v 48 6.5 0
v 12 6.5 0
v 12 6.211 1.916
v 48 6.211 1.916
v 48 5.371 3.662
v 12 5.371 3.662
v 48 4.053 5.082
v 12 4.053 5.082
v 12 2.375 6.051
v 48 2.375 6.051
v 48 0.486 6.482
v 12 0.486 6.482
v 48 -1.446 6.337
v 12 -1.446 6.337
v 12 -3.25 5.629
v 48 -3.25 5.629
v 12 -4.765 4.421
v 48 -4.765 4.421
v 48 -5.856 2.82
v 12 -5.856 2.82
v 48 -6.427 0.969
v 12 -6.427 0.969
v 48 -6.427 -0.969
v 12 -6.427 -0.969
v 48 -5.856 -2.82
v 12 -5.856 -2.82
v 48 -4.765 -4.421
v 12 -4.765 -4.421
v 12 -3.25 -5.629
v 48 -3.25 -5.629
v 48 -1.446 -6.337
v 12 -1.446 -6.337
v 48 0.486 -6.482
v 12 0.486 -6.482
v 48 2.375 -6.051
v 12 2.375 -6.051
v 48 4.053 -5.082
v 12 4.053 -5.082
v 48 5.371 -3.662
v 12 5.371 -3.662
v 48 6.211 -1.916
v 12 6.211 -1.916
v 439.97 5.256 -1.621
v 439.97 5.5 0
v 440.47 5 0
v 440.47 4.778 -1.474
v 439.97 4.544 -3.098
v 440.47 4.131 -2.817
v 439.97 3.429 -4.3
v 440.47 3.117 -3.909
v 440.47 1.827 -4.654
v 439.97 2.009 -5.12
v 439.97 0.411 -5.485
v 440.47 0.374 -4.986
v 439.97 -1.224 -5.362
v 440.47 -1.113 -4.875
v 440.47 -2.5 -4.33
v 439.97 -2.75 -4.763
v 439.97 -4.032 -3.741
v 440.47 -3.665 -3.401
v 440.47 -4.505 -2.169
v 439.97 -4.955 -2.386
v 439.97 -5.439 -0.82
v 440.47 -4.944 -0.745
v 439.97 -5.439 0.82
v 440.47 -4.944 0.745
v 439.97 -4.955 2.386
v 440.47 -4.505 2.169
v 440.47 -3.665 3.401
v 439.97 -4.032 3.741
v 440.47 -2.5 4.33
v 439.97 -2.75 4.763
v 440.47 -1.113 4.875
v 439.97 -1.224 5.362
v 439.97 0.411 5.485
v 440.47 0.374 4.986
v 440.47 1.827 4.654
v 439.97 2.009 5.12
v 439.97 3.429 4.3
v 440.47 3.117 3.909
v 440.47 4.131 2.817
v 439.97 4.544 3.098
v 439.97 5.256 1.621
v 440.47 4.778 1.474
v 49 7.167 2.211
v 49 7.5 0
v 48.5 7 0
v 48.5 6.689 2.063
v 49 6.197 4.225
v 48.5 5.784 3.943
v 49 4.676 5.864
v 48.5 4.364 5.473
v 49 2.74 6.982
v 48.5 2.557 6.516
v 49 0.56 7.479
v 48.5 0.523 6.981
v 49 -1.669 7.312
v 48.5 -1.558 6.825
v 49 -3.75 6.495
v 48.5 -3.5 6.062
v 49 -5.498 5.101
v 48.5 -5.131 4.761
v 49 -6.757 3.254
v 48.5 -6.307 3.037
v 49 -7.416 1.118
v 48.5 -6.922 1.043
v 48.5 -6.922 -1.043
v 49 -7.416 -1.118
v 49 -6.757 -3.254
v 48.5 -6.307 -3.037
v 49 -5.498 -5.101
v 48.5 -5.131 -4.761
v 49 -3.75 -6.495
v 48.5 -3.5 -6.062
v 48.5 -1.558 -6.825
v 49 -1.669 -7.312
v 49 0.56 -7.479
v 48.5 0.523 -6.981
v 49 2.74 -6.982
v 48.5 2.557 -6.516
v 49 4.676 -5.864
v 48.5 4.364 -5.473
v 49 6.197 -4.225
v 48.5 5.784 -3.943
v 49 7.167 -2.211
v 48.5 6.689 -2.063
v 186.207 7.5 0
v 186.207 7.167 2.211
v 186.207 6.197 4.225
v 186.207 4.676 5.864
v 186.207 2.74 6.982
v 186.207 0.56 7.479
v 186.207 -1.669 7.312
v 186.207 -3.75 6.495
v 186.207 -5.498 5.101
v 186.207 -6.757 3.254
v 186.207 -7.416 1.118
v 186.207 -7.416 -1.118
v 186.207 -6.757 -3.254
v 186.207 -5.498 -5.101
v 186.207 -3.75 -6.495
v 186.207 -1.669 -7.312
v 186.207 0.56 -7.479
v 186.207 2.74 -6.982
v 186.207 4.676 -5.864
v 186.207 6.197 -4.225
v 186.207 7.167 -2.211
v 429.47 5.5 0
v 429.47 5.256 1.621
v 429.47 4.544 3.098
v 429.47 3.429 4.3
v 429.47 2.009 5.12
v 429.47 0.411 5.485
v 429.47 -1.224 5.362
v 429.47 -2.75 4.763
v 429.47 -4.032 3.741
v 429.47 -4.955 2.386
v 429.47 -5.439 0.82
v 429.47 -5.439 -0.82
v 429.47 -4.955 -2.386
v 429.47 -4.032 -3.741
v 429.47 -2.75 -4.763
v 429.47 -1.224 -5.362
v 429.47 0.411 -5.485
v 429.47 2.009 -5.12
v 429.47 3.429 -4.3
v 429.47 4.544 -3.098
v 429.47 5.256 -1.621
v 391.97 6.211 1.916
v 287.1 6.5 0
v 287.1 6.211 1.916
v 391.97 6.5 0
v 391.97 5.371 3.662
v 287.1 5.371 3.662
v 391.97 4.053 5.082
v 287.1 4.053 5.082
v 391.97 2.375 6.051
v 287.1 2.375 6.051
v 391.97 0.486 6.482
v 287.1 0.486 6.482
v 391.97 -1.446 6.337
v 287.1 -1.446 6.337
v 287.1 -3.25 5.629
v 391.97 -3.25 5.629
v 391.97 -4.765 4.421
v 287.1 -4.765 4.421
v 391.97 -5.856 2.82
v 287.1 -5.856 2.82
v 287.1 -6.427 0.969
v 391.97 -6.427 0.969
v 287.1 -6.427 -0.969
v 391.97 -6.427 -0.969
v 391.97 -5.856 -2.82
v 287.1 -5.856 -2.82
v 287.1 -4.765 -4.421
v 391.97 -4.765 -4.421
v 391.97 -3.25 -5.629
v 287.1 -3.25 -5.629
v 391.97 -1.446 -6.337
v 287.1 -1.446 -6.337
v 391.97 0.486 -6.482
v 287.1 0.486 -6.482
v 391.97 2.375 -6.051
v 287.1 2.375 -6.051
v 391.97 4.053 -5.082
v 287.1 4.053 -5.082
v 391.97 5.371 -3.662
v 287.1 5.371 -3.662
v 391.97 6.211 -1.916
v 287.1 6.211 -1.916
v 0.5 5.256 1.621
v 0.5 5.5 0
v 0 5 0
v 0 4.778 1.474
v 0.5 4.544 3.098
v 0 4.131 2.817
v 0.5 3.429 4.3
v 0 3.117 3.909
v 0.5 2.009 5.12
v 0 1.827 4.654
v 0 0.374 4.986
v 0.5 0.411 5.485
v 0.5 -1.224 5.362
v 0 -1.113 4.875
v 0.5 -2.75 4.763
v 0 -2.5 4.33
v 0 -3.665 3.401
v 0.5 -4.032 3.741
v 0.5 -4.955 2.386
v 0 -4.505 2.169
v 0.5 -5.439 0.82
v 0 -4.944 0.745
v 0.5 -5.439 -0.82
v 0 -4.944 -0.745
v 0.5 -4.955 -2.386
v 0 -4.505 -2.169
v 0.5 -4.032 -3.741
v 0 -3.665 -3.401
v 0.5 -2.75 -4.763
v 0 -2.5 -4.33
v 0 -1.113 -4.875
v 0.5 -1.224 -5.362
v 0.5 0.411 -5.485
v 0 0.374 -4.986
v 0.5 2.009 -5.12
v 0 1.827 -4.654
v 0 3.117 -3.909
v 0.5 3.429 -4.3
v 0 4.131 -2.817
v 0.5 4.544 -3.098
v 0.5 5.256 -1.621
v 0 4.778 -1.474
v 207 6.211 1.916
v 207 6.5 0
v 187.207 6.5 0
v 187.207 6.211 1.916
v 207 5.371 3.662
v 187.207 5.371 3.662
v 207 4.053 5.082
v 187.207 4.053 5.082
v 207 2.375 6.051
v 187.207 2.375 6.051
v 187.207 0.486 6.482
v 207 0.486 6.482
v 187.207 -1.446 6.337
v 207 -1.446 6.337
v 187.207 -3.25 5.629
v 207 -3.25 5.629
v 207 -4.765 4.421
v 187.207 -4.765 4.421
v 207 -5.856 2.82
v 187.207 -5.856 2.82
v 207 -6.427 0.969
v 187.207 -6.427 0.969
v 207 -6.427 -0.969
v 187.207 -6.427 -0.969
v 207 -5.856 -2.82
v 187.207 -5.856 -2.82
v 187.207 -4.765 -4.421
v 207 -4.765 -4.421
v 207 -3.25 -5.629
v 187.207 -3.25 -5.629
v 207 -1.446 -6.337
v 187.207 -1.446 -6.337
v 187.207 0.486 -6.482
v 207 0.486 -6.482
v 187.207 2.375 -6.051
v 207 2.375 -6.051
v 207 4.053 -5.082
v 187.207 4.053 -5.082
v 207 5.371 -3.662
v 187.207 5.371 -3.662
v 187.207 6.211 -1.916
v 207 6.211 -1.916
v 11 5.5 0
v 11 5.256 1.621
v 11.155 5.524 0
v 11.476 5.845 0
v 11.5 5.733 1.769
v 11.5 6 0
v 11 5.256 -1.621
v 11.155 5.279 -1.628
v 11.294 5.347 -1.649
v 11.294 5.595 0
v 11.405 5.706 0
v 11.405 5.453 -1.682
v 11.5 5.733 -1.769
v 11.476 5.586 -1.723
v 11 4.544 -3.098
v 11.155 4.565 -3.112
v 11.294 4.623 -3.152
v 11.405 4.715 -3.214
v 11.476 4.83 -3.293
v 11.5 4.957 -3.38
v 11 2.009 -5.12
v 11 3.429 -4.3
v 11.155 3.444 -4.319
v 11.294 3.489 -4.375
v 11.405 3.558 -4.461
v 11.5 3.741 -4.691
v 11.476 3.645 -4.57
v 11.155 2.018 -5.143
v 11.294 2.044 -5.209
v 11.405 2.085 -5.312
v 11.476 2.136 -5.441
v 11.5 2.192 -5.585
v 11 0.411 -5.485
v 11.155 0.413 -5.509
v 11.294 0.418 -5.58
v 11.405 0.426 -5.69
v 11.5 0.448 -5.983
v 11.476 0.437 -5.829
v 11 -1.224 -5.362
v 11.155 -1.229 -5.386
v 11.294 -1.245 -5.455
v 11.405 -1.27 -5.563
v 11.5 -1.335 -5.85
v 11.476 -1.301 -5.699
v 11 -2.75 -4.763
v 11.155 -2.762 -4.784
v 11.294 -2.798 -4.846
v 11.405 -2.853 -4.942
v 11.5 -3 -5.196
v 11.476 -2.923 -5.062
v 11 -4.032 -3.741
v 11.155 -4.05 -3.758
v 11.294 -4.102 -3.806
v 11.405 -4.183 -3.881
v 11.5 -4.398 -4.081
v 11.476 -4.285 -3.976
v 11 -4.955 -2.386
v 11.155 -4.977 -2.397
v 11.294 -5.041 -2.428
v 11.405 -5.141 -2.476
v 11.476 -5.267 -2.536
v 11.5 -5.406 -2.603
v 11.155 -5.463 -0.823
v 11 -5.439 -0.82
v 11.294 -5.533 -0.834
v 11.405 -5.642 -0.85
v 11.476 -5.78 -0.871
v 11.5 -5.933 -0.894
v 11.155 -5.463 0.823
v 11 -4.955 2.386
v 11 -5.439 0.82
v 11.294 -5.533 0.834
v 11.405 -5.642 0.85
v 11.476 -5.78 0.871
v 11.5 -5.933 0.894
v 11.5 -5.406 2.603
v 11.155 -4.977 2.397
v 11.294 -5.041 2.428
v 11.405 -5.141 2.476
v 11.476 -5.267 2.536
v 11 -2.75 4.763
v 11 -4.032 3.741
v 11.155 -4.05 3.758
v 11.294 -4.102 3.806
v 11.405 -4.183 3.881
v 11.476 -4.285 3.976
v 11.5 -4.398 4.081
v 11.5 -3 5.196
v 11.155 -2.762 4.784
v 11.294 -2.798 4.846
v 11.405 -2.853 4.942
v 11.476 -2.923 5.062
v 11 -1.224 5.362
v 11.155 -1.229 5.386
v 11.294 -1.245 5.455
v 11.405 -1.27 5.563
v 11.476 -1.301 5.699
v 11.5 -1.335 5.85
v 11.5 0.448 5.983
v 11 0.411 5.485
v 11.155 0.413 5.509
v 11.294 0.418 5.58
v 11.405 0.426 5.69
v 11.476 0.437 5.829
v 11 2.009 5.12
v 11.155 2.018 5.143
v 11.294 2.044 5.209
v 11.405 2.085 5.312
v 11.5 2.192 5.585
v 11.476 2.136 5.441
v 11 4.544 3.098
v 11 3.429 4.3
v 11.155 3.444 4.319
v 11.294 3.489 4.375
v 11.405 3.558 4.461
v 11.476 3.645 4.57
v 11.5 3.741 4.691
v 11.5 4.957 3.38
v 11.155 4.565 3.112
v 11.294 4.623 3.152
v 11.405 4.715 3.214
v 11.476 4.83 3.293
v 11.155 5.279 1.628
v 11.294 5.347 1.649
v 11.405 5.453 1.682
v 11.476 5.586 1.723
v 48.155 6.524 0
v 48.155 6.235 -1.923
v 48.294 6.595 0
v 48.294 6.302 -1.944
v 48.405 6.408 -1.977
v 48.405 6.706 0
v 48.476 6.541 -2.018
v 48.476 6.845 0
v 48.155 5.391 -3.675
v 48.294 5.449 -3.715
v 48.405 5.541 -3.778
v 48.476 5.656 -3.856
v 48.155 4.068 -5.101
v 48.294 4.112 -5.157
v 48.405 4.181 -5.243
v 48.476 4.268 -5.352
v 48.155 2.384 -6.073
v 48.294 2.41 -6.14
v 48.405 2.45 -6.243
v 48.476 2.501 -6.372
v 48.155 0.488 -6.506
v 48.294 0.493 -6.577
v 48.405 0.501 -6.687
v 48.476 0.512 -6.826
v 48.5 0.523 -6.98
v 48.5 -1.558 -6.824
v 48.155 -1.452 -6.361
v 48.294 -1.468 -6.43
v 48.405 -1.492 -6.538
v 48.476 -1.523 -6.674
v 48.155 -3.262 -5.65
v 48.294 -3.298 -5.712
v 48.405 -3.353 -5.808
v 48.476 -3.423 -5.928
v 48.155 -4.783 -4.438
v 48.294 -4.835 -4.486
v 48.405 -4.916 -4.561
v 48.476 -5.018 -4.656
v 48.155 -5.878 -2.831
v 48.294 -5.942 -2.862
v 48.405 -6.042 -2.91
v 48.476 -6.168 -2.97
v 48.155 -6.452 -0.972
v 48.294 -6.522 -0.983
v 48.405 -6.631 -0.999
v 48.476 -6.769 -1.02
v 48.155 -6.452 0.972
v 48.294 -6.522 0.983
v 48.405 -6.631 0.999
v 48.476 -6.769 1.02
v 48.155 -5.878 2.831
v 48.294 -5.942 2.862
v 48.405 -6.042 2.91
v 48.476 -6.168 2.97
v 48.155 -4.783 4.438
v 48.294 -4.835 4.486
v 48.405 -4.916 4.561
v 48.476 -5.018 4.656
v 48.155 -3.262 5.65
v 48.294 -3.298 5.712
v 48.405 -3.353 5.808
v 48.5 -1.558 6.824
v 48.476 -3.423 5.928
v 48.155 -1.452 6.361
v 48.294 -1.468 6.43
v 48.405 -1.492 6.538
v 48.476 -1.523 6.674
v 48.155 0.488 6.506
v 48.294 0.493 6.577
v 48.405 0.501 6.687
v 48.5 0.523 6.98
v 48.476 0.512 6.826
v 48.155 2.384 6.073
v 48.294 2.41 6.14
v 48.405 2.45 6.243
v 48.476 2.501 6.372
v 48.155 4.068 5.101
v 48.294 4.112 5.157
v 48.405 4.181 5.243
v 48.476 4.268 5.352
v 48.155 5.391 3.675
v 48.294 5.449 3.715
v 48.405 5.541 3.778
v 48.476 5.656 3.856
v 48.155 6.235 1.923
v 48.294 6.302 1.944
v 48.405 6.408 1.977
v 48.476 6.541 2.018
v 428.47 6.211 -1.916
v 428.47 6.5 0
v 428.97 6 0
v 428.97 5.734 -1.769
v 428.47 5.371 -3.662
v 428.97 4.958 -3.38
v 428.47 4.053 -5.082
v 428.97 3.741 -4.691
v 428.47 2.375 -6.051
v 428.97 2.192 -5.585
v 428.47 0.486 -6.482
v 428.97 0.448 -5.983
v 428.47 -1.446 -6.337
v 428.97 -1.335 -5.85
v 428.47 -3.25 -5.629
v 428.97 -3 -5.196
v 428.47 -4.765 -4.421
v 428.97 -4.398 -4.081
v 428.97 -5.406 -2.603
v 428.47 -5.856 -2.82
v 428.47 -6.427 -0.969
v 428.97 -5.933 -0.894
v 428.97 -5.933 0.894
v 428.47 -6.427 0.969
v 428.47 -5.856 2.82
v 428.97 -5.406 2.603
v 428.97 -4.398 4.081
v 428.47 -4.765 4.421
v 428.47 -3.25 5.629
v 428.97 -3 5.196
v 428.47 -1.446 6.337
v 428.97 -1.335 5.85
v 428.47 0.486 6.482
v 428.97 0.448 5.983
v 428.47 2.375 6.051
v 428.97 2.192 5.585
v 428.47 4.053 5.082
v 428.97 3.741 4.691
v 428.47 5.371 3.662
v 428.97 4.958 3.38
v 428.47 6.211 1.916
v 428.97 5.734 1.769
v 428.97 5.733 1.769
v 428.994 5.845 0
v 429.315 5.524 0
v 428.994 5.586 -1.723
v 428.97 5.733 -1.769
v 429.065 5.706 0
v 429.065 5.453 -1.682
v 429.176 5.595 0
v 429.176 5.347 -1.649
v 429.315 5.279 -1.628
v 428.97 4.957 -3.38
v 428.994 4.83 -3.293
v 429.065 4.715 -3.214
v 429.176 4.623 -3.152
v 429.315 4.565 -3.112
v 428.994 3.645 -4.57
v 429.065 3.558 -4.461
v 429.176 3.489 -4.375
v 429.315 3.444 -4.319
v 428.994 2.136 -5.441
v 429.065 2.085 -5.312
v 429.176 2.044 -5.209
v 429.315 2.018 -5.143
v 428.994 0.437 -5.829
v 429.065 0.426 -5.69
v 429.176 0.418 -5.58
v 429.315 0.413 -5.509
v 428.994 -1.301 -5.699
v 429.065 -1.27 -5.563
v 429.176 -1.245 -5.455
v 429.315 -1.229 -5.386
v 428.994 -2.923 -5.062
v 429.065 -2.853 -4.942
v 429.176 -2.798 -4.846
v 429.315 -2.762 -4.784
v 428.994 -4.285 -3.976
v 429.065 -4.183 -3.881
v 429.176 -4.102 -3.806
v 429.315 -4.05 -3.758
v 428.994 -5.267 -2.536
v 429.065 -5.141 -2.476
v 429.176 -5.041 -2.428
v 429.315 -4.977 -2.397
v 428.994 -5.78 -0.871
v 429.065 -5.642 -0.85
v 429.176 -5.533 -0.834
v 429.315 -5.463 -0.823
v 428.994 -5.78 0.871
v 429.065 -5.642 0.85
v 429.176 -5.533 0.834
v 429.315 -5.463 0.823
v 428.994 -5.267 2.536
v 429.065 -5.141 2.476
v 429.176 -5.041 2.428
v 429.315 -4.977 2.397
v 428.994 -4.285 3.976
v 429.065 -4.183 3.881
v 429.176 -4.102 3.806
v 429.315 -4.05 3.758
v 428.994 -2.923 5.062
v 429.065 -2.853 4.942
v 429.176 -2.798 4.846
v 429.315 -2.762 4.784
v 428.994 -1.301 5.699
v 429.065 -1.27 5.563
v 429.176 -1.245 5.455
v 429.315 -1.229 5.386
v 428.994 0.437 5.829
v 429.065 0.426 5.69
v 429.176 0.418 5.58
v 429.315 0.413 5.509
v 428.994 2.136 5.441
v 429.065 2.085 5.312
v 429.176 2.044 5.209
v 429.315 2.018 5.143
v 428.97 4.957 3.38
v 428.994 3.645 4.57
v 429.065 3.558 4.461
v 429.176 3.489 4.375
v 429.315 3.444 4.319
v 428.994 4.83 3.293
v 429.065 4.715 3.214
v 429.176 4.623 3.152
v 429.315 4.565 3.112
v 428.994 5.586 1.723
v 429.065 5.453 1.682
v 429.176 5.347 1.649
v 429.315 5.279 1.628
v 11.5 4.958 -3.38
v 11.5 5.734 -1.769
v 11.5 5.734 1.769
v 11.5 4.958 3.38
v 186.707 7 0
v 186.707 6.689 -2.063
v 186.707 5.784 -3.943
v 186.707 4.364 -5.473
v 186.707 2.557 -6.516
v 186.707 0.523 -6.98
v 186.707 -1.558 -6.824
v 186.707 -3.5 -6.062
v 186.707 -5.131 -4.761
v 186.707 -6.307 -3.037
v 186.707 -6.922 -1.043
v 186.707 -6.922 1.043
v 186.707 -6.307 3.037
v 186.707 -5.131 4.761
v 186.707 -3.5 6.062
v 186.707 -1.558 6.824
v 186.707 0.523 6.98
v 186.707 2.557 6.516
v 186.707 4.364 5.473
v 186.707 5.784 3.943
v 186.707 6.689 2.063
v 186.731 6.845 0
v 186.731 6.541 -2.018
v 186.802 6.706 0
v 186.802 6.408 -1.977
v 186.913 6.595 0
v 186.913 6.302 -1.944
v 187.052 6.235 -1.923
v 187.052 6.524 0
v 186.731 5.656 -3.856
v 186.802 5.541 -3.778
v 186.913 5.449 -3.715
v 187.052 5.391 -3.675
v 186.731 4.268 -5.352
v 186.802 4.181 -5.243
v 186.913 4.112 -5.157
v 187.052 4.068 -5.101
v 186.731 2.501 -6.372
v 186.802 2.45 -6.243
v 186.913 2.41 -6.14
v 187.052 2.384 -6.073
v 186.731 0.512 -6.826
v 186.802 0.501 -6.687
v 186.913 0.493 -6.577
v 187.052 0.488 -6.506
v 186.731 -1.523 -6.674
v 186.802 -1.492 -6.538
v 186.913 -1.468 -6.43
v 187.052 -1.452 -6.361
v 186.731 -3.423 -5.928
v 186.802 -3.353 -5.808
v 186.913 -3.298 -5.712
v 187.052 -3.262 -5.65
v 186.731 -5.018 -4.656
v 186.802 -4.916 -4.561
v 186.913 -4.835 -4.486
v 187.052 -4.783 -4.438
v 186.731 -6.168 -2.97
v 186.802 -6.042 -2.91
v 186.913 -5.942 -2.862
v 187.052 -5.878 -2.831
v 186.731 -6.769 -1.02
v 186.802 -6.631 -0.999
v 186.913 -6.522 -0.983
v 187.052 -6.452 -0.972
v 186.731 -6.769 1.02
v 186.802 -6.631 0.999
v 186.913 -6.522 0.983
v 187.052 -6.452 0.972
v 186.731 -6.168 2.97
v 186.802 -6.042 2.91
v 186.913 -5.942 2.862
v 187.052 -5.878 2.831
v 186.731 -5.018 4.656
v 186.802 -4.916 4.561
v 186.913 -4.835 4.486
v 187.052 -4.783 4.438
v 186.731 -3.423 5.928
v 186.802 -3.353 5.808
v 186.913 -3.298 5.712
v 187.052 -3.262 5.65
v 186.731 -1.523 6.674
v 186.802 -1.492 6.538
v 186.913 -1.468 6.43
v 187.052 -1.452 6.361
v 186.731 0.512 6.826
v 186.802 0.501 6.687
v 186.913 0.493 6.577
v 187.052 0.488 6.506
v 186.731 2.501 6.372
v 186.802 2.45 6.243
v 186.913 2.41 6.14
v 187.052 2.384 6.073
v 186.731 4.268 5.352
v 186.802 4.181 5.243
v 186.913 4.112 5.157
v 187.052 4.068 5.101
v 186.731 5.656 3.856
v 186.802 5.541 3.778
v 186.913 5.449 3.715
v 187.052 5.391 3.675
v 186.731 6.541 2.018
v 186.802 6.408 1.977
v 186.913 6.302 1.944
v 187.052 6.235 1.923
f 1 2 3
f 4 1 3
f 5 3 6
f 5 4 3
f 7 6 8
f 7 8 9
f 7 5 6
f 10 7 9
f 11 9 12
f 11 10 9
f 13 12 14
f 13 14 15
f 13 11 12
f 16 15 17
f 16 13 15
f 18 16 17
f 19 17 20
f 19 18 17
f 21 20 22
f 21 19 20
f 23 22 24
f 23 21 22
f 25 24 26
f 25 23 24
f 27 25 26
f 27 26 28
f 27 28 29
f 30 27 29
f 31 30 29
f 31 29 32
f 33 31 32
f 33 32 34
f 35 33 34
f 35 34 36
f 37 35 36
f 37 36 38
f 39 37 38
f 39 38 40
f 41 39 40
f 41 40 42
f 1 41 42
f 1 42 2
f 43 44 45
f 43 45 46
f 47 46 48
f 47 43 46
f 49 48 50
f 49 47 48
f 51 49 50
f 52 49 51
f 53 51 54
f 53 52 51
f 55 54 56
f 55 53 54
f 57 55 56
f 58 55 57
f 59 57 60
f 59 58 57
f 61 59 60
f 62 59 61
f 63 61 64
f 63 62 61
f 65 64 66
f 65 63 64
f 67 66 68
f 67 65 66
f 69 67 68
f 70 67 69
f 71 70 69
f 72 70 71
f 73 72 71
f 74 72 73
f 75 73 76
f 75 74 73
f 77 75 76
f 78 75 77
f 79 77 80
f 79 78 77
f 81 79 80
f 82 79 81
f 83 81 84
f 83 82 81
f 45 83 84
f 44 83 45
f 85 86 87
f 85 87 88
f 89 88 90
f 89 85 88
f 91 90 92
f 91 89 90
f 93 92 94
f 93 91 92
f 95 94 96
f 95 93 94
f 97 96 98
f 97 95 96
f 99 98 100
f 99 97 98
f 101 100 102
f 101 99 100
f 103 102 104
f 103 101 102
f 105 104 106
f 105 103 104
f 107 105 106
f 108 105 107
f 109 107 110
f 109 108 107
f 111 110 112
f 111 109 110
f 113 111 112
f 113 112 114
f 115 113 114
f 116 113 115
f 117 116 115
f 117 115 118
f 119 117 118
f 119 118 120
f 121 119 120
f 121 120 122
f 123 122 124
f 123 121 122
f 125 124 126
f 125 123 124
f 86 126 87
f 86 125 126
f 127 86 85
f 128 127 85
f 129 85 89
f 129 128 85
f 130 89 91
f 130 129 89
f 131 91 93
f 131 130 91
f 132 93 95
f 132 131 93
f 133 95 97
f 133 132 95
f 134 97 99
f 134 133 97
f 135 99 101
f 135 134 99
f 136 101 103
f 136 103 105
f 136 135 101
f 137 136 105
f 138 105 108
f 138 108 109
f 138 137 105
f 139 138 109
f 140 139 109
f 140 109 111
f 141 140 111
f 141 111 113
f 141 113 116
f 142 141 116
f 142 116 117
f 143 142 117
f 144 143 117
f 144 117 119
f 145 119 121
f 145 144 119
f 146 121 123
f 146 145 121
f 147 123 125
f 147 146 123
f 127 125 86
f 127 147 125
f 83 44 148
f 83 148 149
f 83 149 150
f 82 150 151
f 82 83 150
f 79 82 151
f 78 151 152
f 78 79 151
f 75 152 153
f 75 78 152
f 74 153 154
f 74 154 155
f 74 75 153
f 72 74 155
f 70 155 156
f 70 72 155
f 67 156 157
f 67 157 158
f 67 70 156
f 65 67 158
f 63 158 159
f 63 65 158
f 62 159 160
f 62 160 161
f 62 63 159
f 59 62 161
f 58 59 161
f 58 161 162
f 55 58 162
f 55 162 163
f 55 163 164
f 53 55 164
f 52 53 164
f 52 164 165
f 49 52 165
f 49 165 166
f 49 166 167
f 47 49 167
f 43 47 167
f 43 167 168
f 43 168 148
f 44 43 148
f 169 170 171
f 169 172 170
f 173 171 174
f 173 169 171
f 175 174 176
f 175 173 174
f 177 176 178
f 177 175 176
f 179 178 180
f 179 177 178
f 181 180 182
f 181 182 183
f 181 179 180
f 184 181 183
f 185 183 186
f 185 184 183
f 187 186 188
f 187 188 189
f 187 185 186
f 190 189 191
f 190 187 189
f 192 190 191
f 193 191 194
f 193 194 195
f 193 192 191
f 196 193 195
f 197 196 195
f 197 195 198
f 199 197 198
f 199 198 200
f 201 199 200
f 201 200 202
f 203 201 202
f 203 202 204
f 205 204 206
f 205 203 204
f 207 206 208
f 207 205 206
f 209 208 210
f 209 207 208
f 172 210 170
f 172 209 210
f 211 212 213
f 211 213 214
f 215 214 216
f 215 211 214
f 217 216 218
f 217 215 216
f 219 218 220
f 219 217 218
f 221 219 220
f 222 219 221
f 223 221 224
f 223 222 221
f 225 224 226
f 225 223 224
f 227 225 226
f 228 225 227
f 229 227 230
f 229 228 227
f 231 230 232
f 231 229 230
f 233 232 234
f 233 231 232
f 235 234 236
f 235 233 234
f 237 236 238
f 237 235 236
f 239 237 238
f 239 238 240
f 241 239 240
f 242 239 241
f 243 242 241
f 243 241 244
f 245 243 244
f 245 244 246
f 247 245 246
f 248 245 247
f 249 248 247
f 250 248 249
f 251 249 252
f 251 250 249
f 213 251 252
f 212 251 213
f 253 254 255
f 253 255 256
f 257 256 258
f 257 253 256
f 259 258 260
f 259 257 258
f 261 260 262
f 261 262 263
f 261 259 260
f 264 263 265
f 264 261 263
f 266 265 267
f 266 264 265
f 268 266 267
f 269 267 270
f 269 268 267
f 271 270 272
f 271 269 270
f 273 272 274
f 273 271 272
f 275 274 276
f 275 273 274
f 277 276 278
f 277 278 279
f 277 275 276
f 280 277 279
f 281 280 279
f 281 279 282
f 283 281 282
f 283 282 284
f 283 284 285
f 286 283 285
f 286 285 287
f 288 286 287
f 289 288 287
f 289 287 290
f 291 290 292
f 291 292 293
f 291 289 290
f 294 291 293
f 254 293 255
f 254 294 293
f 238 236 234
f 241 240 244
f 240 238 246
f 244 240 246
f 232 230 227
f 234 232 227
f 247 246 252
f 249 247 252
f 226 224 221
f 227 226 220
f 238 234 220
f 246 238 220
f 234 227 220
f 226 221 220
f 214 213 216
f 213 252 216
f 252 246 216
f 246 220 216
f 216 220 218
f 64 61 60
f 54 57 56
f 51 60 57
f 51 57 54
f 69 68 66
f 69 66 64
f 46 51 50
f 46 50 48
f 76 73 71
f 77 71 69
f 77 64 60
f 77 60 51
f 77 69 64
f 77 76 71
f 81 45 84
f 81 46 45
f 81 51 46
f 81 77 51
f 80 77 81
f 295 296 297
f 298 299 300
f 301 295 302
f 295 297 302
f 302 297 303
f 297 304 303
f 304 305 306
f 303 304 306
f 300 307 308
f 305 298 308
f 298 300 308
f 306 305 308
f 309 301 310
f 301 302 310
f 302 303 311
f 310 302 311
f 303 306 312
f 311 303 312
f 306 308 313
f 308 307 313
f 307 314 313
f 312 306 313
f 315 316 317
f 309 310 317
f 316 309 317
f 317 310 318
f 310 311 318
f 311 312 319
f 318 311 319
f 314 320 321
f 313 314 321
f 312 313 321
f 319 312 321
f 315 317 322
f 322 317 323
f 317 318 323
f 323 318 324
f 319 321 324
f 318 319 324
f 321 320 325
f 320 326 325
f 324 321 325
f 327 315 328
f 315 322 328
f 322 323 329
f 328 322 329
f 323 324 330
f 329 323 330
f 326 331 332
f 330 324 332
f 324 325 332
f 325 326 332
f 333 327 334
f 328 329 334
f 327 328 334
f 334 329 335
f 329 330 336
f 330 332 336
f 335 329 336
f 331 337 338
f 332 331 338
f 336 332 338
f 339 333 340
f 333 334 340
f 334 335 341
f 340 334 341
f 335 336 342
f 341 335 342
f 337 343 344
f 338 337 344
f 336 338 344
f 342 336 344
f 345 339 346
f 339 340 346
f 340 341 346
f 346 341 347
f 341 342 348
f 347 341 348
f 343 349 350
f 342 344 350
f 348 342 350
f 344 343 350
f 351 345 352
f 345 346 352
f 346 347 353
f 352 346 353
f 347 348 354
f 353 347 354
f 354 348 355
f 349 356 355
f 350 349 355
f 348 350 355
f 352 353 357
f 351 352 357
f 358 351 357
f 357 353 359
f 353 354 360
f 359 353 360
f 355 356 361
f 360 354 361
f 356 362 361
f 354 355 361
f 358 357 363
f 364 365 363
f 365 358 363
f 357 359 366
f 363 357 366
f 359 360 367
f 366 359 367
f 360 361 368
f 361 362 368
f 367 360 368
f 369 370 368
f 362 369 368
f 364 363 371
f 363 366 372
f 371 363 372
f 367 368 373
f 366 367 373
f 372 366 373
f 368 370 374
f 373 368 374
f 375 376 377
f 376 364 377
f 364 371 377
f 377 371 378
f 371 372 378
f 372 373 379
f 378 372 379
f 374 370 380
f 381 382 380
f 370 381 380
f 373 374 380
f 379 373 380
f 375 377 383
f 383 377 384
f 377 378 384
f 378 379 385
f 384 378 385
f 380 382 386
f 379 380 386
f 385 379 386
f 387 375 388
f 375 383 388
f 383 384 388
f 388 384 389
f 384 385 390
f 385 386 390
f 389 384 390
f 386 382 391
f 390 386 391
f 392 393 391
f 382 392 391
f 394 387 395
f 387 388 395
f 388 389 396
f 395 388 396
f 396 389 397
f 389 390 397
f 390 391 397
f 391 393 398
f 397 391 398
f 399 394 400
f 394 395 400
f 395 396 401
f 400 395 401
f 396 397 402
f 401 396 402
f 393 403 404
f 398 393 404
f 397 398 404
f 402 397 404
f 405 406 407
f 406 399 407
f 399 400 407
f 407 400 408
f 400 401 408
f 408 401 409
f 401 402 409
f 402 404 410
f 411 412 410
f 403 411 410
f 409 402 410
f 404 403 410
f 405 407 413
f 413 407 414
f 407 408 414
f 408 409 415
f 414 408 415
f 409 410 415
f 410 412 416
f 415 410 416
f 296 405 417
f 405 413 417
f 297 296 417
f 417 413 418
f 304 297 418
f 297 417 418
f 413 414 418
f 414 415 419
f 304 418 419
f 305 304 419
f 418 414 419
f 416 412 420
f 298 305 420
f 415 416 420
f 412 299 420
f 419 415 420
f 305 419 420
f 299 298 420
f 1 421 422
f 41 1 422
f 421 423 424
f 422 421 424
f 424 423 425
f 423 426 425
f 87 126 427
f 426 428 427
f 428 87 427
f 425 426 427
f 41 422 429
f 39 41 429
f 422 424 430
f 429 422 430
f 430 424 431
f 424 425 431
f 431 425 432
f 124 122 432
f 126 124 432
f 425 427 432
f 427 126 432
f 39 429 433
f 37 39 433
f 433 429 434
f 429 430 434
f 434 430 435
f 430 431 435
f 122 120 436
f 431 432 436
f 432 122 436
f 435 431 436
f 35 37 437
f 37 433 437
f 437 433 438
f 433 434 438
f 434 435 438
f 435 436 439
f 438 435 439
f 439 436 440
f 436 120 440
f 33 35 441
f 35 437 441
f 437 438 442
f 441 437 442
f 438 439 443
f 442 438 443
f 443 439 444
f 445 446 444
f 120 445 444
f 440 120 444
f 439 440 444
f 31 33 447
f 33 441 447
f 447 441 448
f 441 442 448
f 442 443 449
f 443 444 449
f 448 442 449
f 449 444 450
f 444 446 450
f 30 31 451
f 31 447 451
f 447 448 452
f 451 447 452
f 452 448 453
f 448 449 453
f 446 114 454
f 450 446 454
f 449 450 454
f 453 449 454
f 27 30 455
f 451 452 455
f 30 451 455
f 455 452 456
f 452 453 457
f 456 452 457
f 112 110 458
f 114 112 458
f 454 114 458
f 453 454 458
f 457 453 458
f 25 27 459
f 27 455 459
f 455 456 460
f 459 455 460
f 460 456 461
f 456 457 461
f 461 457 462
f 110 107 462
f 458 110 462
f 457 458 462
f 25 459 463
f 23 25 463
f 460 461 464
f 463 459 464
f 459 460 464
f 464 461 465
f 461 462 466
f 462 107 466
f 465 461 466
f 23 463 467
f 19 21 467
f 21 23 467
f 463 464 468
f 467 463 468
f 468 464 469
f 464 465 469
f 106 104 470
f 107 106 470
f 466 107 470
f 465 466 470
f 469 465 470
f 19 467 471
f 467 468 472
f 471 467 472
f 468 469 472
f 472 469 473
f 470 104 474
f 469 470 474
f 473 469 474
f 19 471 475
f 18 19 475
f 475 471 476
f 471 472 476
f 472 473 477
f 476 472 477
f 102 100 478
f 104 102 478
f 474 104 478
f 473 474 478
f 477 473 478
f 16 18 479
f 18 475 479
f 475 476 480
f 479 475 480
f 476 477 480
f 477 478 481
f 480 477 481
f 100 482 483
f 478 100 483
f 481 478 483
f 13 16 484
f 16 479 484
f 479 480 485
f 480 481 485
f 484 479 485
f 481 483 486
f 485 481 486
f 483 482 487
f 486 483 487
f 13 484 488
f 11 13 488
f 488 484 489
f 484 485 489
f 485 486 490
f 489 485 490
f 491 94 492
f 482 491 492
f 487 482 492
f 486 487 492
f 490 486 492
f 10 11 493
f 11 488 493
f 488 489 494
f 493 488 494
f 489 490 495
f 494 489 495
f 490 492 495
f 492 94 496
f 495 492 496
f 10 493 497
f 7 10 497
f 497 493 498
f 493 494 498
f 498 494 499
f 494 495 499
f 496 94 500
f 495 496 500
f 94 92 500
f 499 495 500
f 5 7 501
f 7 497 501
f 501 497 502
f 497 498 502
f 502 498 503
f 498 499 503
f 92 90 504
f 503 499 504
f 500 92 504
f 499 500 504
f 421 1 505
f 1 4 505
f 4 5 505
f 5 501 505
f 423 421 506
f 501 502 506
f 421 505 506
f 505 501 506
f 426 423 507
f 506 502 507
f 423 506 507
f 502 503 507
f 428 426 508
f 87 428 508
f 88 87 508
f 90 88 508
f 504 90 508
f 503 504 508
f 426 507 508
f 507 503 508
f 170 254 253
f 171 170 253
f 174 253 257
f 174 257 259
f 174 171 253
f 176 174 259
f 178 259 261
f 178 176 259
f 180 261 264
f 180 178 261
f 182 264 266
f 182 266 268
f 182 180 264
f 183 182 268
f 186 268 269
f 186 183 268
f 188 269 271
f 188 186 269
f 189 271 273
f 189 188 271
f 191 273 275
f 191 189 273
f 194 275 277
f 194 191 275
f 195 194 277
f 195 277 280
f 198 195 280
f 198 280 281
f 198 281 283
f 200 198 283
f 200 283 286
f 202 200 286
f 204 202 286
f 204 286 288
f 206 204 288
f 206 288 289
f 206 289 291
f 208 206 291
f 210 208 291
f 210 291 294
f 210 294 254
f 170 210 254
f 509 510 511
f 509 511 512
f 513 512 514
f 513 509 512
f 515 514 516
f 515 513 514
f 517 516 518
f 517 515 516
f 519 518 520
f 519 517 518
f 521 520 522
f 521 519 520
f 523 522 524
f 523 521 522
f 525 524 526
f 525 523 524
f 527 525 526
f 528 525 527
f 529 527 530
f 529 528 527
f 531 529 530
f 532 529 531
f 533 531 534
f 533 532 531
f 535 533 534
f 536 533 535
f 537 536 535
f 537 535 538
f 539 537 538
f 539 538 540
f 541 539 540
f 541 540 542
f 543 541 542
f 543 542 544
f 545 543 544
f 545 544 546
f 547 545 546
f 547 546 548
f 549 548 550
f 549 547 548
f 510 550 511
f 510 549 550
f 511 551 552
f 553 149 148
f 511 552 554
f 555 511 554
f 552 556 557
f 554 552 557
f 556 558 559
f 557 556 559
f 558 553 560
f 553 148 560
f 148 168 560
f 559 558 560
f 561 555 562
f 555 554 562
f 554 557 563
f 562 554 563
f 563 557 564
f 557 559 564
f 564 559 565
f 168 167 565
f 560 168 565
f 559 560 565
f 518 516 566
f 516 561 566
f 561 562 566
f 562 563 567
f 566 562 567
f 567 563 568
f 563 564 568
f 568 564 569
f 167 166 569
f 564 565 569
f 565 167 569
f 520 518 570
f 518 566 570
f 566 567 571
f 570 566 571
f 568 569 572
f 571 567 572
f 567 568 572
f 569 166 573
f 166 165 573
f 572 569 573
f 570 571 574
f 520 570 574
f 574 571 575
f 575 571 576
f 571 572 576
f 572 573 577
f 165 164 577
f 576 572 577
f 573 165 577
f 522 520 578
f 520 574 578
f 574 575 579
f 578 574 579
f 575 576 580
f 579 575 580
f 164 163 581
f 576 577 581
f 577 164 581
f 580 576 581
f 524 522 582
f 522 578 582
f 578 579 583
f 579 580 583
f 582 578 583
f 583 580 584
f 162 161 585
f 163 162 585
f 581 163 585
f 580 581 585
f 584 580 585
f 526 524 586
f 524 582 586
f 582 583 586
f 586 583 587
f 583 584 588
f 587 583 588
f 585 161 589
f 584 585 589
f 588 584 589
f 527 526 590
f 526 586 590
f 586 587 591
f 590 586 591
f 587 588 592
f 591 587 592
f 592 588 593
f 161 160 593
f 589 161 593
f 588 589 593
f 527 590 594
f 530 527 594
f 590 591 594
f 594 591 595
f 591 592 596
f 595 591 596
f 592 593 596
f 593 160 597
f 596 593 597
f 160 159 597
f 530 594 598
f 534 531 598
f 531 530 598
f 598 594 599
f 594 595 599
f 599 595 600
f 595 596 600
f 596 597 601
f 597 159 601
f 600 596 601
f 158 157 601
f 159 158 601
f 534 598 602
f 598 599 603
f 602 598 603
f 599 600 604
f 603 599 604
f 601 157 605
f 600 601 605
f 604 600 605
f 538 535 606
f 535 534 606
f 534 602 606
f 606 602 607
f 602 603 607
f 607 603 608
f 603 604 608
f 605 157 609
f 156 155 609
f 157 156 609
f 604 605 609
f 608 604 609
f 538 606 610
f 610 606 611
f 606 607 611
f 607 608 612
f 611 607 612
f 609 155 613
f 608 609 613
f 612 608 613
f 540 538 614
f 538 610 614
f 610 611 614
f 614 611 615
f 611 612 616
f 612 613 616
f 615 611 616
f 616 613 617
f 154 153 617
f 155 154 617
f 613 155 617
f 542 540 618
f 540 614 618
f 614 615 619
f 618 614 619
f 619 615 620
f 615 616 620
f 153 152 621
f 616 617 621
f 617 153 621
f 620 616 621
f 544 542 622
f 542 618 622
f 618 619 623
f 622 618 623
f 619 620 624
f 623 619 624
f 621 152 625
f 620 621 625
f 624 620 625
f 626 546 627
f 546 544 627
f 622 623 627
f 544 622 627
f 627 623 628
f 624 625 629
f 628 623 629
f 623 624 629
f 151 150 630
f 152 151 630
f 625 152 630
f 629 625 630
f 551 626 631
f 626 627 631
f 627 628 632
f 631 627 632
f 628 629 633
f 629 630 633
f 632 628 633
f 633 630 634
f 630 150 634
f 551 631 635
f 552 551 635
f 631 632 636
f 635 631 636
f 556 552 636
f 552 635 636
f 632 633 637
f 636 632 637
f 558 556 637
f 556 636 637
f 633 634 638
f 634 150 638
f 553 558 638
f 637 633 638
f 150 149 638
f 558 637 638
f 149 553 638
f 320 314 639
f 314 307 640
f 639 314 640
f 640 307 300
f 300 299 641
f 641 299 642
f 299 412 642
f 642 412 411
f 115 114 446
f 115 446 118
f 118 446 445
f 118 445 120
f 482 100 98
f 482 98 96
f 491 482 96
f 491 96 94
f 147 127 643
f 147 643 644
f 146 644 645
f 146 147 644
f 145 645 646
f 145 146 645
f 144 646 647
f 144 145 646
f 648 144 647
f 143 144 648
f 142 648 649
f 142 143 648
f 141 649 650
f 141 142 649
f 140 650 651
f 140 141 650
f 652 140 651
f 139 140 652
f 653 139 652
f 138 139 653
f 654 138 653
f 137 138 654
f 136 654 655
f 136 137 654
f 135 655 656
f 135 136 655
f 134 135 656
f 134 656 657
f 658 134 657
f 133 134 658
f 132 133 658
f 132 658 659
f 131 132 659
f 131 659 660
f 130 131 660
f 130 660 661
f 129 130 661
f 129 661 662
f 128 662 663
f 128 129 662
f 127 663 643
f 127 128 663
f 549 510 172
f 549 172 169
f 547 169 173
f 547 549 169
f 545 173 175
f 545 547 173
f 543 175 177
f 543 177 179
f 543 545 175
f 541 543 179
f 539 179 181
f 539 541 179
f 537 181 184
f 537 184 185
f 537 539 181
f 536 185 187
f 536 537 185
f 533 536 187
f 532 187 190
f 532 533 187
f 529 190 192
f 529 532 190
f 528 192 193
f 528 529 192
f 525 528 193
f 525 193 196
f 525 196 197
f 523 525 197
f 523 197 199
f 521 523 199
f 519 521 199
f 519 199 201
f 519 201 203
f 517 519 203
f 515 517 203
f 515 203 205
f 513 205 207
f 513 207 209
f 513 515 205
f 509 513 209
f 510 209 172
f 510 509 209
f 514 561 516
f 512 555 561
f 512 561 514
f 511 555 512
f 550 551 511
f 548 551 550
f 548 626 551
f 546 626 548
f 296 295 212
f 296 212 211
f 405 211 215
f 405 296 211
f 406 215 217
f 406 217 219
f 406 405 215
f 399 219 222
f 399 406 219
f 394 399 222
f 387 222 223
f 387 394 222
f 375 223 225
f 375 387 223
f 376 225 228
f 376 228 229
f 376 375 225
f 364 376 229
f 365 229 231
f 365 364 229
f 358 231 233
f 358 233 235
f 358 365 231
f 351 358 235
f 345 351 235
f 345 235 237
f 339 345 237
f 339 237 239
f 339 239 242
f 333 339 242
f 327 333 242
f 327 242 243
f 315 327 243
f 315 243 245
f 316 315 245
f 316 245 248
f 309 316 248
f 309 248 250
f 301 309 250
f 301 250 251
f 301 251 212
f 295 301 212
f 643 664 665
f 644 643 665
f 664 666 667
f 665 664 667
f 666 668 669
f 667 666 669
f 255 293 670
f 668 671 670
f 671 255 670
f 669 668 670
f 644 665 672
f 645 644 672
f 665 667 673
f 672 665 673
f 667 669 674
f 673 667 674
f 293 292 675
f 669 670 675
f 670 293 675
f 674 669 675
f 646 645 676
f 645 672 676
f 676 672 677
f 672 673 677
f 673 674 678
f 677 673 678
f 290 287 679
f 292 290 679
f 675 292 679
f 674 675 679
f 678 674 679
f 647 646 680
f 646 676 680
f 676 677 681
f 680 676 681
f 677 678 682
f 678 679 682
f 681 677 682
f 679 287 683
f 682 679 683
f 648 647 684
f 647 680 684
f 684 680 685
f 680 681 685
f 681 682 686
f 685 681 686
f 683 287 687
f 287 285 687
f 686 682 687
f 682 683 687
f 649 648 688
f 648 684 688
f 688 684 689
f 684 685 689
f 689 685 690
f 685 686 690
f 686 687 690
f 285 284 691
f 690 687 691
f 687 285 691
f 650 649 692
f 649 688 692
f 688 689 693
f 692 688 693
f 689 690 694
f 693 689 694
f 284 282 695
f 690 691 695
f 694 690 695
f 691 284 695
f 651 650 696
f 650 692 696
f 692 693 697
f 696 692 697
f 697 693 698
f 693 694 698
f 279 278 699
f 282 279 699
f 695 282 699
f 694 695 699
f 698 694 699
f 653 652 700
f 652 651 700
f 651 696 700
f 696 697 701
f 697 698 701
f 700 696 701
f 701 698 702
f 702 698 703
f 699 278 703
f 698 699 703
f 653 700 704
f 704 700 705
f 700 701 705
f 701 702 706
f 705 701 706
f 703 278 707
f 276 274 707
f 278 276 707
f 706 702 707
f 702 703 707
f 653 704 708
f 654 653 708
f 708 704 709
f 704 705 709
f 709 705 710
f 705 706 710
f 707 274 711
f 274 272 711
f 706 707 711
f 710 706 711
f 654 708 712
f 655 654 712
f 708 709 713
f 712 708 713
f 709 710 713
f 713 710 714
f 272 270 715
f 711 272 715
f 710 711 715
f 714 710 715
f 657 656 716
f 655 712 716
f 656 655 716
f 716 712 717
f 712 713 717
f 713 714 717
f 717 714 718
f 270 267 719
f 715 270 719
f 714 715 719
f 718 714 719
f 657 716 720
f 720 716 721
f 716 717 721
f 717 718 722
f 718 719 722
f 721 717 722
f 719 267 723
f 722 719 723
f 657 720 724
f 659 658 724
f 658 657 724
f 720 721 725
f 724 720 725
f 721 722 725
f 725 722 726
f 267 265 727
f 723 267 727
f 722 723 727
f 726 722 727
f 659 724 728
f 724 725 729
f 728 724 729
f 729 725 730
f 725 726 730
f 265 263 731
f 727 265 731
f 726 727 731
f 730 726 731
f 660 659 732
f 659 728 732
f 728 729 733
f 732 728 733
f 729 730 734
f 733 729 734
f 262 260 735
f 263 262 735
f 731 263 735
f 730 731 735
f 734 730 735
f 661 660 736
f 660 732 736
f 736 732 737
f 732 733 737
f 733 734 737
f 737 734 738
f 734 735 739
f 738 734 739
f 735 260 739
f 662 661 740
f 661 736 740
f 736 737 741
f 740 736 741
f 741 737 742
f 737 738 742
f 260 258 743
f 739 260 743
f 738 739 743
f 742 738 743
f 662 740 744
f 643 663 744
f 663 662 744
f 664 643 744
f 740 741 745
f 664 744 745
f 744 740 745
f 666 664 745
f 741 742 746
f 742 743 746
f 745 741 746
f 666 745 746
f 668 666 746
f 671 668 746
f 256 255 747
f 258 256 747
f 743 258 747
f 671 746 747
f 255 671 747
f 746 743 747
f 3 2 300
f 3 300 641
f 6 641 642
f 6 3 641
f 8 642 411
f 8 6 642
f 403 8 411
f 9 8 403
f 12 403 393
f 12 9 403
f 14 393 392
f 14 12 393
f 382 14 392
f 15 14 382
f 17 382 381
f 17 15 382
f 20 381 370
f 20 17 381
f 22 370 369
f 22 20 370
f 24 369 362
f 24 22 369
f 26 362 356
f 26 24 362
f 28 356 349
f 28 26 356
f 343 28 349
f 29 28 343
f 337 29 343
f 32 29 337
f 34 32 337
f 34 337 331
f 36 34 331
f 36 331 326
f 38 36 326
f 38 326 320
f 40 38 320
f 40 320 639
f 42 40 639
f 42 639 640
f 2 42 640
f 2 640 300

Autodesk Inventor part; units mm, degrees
ref_plane "Plano inicial" through (0, 0, 0) normal (1, 0, 0) x (0, 1, 0)
ref_plane "XZ Plane" through (0, 0, 0) normal (0, 1, 0) x (-1, 0, 0)
ref_plane "XY Plane" through (0, 0, 0) normal (0, 0, 1) x (1, 0, 0)
sketch "Boceto principal" plane through (0, 0, 0) normal (0, 0, 1) x (1, 0, 0)
  line L0 (0, 0) -> (440.47, 0)
  line L1 (11.5, 5.5) -> (11.5, 6.5)
  line L2 (11.5, 6.5) -> (48.5, 6.5)
  line L3 (0, 5.5) -> (11.5, 5.5)
  line L4 (186.707, 7.5) -> (186.707, 6.5)
  line L5 (48.5, 7.5) -> (186.707, 7.5)
  line L6 (0, 0) -> (0, 5.5)
  line L7 (48.5, 6.5) -> (48.5, 7.5)
  line L8 (186.707, 6.5) -> (207, 6.5)
  line L9 (207, 6.5) -> (287.1, 6.5)
  line L10 (287.1, 6.5) -> (391.97, 6.5)
  line L11 (428.97, 6.5) -> (428.97, 5.5)
  line L12 (391.97, 6.5) -> (428.97, 6.5)
  line L13 (440.47, 5.5) -> (440.47, 0)
  line L14 (428.97, 5.5) -> (440.47, 5.5)
  dimension "d3" = 13
  dimension "d4" = 11
  dimension "d5" = 15
  dimension "d10" = 13
  dimension "d11" = 13
  dimension "d12" = 13
  dimension "d13" = 13
  dimension "d41" = 11
revolve "Revolución1" add sketch "Boceto principal" angle 360 about axis through (0, 0, 0) along (1, 0, 0)
fillet "Fillet7" radius 0.5 1 edges at (428.97, -5.5, 0)
chamfer "Chamfer9" distance 0.5 angle 45 1 edges at (440.47, -5.5, 0) measured on face at (433.1367, 5.4288, -0.8823)
chamfer "Chamfer2" distance 0.5 angle 45 1 edges at (0, -5.5, 0) measured on face at (3.8333, 5.4288, -0.8823)
fillet "Fillet1" radius 0.5 1 edges at (11.5, -5.5, 0)
fillet "Fillet2" radius 0.5 1 edges at (48.5, -6.5, 0)
chamfer "Chamfer3" distance 0.5 angle 45 1 edges at (48.5, -7.5, 0) measured on face at (94.569, 7.4029, -1.2031)
chamfer "Chamfer4" distance 0.5 angle 45 1 edges at (186.707, -7.5, 0) measured on face at (94.9023, 7.4757, -0.6035)
fillet "Fillet3" radius 0.5 1 edges at (186.707, -6.5, 0)
chamfer "Chamfer8" distance 0.5 angle 45 1 edges at (428.97, -6.5, 0) measured on face at (404.3033, 6.4158, -1.0427)
chamfer "Chaflán1" distance 0.5 angle 45 1 edges at (11.5, -6.5, 0) measured on face at (23.6667, 6.4789, -0.523)
properties part number "Eje" material "Steel"
